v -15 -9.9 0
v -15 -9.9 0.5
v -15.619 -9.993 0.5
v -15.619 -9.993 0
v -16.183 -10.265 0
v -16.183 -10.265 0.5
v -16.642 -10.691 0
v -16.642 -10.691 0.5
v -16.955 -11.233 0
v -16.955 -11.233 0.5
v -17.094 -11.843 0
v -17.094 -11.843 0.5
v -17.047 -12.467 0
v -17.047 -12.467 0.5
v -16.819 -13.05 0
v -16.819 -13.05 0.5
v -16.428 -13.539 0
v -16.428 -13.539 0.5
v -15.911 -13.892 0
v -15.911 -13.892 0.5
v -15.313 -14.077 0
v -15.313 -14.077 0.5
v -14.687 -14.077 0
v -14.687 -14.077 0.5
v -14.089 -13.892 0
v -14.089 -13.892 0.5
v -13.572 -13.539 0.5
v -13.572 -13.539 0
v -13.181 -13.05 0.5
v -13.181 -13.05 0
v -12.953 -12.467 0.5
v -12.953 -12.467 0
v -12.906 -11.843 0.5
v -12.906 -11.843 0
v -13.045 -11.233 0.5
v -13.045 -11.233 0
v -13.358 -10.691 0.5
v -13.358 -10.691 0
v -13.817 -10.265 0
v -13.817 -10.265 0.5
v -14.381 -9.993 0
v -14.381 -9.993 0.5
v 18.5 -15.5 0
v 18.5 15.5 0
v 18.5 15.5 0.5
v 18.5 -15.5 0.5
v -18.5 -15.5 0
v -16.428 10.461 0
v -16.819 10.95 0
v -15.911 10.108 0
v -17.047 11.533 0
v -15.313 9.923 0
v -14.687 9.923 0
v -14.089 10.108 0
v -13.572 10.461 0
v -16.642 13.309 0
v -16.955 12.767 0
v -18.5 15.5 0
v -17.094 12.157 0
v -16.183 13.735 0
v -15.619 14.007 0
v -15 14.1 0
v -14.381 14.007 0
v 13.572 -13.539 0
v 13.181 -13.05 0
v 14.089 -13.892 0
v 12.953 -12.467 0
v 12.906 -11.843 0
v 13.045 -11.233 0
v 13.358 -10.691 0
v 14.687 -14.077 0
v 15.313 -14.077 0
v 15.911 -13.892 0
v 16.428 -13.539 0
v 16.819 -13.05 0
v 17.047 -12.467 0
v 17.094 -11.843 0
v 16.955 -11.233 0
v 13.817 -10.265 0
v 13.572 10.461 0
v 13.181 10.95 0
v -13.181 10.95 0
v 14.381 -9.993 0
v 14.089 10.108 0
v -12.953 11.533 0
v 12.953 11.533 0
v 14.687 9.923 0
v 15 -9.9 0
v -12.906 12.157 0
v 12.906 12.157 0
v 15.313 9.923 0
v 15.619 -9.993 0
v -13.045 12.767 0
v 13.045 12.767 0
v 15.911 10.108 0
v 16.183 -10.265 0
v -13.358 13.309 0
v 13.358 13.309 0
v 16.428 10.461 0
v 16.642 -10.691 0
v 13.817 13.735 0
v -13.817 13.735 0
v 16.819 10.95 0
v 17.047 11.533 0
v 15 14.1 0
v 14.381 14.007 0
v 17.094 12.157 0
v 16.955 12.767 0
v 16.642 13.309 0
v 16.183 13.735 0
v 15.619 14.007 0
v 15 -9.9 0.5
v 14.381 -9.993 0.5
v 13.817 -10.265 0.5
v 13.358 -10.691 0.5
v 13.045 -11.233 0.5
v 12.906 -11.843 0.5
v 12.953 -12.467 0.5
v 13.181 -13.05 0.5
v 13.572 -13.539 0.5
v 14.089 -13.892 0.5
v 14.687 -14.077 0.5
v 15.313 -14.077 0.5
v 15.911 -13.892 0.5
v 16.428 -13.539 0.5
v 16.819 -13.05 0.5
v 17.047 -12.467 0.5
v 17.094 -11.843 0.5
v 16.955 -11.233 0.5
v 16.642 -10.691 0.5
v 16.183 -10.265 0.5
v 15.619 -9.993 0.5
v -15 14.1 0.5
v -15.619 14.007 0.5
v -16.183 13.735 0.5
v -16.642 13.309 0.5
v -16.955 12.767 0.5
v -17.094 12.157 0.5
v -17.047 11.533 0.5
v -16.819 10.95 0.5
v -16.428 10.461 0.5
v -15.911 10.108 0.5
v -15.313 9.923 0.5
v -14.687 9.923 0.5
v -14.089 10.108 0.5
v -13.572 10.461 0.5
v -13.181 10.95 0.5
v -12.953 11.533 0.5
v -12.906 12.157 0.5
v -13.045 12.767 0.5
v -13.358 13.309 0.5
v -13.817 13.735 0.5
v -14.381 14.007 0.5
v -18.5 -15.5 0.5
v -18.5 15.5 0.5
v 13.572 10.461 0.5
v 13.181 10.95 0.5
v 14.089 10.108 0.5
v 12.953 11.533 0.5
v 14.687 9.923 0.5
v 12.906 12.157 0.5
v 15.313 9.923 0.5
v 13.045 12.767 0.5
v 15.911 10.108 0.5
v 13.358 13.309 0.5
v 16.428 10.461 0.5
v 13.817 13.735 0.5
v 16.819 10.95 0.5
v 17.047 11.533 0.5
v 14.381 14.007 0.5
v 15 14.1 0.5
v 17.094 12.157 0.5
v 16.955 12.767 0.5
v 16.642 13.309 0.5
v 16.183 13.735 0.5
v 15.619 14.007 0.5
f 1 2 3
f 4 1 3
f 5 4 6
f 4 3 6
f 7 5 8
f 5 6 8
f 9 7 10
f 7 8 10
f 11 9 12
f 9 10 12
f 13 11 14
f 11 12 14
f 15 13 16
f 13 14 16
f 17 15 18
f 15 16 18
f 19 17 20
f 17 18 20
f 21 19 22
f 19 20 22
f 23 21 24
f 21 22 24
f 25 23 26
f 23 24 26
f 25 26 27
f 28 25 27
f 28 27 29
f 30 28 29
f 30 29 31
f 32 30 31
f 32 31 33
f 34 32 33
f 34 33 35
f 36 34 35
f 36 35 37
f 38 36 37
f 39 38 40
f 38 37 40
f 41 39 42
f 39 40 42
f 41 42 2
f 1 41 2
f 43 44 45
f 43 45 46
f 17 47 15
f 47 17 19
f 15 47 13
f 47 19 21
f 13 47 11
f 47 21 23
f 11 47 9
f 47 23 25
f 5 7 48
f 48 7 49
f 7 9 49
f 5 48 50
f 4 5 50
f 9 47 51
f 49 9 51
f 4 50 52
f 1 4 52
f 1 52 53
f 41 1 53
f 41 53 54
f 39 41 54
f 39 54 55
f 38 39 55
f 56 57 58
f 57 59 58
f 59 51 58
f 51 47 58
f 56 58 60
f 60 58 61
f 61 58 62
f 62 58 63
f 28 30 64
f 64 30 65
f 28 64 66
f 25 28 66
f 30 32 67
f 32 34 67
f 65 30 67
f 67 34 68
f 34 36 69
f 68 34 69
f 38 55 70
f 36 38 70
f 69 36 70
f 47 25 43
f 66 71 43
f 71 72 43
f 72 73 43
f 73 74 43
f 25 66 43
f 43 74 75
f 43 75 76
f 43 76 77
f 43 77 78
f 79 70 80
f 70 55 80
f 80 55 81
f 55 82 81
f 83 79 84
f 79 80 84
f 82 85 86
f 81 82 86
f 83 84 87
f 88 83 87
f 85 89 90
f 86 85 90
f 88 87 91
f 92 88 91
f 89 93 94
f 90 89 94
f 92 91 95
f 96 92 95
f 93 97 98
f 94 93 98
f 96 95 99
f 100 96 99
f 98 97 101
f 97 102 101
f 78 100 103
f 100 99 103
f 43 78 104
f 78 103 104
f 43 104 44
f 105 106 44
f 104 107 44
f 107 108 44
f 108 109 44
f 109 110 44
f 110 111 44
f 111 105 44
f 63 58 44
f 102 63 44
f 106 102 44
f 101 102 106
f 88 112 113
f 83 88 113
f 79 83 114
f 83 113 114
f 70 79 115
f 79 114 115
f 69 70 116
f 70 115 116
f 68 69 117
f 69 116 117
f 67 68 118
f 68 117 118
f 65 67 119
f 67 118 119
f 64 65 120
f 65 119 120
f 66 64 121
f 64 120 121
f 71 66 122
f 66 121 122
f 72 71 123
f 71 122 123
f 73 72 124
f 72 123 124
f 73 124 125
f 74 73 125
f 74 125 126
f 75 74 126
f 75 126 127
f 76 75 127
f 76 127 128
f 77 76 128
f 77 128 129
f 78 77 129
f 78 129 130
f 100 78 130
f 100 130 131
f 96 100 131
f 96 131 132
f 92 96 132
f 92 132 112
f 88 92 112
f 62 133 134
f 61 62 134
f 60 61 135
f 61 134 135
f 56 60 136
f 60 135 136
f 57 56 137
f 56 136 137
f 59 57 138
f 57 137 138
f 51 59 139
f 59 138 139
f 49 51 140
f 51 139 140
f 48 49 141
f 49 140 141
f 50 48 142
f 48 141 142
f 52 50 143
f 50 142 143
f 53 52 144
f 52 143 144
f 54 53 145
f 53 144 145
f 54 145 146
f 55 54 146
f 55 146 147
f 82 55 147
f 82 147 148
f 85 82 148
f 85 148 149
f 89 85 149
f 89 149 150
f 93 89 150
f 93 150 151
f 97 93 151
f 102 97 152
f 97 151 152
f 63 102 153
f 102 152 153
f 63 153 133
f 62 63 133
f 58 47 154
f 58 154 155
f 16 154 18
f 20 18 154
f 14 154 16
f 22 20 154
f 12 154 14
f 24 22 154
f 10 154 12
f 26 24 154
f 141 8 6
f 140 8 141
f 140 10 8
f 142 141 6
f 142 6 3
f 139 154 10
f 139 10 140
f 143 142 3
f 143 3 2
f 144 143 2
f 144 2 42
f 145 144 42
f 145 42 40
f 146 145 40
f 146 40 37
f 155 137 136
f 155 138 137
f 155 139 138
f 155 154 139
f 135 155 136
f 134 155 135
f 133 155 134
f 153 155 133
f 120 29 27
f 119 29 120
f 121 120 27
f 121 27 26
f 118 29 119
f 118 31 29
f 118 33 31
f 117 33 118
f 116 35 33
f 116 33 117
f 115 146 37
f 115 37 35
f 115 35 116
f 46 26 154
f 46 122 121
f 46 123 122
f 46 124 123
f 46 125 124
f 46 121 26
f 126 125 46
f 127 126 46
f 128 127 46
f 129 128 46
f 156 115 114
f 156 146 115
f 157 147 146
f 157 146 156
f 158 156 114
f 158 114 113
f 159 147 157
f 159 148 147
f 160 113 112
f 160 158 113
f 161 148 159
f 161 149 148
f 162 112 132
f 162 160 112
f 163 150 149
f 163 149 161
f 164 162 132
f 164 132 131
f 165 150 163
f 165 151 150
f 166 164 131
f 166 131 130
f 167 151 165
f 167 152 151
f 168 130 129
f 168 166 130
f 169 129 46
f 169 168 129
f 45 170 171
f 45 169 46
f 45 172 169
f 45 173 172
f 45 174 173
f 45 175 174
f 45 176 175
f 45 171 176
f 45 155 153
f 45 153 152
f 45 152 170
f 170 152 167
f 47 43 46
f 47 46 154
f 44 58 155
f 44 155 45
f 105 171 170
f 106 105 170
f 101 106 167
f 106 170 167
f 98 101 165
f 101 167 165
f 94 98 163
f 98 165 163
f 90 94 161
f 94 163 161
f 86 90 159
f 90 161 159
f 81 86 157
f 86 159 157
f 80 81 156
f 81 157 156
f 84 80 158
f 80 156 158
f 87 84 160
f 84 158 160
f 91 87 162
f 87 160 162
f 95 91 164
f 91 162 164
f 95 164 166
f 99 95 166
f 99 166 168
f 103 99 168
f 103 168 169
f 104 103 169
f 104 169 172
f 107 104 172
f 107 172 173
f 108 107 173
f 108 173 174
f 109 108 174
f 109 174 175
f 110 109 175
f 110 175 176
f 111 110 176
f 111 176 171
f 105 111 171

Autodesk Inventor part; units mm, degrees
ref_plane "YZ Plane" through (0, 0, 0) normal (1, 0, 0) x (0, 1, 0)
ref_plane "XZ Plane" through (0, 0, 0) normal (0, 1, 0) x (-1, 0, 0)
ref_plane "XY Plane" through (0, 0, 0) normal (0, 0, 1) x (1, 0, 0)
sketch "草图1" plane through (0, 0, 0) normal (0, 0, 1) x (1, 0, 0)
  line L0 (18.5, -15.5) -> (-18.5, -15.5)
  line L1 (-18.5, -15.5) -> (-18.5, 15.5)
  line L2 (-18.5, 15.5) -> (18.5, 15.5)
  line L3 (18.5, 15.5) -> (18.5, -15.5)
  line L4 (18.5, -15.5) -> (-18.5, 15.5) construction
  line L5 (-18.5, -15.5) -> (18.5, 15.5) construction
  line L6 (0, 0) -> (-24.9379, 0) construction
  line L7 (0, 0) -> (0, 16.8364) construction
  point P0 (-15, 12)
  point P1 (-15, -12)
  point P2 (15, 12)
  point P3 (15, -12)
  dimension "d0" = 31
  dimension "d1" = 37
  dimension "d2" = 12
  dimension "d3" = 15
extrude "拉伸1" add sketch "草图1" along normal blind 0.5
hole "孔1" at (-15, 12, 0) at (-15, -12, 0) at (15, 12, 0) at (15, -12, 0) direction (0, 0, 1) diameter 4.2 end through all
properties part number "自制垫片"
